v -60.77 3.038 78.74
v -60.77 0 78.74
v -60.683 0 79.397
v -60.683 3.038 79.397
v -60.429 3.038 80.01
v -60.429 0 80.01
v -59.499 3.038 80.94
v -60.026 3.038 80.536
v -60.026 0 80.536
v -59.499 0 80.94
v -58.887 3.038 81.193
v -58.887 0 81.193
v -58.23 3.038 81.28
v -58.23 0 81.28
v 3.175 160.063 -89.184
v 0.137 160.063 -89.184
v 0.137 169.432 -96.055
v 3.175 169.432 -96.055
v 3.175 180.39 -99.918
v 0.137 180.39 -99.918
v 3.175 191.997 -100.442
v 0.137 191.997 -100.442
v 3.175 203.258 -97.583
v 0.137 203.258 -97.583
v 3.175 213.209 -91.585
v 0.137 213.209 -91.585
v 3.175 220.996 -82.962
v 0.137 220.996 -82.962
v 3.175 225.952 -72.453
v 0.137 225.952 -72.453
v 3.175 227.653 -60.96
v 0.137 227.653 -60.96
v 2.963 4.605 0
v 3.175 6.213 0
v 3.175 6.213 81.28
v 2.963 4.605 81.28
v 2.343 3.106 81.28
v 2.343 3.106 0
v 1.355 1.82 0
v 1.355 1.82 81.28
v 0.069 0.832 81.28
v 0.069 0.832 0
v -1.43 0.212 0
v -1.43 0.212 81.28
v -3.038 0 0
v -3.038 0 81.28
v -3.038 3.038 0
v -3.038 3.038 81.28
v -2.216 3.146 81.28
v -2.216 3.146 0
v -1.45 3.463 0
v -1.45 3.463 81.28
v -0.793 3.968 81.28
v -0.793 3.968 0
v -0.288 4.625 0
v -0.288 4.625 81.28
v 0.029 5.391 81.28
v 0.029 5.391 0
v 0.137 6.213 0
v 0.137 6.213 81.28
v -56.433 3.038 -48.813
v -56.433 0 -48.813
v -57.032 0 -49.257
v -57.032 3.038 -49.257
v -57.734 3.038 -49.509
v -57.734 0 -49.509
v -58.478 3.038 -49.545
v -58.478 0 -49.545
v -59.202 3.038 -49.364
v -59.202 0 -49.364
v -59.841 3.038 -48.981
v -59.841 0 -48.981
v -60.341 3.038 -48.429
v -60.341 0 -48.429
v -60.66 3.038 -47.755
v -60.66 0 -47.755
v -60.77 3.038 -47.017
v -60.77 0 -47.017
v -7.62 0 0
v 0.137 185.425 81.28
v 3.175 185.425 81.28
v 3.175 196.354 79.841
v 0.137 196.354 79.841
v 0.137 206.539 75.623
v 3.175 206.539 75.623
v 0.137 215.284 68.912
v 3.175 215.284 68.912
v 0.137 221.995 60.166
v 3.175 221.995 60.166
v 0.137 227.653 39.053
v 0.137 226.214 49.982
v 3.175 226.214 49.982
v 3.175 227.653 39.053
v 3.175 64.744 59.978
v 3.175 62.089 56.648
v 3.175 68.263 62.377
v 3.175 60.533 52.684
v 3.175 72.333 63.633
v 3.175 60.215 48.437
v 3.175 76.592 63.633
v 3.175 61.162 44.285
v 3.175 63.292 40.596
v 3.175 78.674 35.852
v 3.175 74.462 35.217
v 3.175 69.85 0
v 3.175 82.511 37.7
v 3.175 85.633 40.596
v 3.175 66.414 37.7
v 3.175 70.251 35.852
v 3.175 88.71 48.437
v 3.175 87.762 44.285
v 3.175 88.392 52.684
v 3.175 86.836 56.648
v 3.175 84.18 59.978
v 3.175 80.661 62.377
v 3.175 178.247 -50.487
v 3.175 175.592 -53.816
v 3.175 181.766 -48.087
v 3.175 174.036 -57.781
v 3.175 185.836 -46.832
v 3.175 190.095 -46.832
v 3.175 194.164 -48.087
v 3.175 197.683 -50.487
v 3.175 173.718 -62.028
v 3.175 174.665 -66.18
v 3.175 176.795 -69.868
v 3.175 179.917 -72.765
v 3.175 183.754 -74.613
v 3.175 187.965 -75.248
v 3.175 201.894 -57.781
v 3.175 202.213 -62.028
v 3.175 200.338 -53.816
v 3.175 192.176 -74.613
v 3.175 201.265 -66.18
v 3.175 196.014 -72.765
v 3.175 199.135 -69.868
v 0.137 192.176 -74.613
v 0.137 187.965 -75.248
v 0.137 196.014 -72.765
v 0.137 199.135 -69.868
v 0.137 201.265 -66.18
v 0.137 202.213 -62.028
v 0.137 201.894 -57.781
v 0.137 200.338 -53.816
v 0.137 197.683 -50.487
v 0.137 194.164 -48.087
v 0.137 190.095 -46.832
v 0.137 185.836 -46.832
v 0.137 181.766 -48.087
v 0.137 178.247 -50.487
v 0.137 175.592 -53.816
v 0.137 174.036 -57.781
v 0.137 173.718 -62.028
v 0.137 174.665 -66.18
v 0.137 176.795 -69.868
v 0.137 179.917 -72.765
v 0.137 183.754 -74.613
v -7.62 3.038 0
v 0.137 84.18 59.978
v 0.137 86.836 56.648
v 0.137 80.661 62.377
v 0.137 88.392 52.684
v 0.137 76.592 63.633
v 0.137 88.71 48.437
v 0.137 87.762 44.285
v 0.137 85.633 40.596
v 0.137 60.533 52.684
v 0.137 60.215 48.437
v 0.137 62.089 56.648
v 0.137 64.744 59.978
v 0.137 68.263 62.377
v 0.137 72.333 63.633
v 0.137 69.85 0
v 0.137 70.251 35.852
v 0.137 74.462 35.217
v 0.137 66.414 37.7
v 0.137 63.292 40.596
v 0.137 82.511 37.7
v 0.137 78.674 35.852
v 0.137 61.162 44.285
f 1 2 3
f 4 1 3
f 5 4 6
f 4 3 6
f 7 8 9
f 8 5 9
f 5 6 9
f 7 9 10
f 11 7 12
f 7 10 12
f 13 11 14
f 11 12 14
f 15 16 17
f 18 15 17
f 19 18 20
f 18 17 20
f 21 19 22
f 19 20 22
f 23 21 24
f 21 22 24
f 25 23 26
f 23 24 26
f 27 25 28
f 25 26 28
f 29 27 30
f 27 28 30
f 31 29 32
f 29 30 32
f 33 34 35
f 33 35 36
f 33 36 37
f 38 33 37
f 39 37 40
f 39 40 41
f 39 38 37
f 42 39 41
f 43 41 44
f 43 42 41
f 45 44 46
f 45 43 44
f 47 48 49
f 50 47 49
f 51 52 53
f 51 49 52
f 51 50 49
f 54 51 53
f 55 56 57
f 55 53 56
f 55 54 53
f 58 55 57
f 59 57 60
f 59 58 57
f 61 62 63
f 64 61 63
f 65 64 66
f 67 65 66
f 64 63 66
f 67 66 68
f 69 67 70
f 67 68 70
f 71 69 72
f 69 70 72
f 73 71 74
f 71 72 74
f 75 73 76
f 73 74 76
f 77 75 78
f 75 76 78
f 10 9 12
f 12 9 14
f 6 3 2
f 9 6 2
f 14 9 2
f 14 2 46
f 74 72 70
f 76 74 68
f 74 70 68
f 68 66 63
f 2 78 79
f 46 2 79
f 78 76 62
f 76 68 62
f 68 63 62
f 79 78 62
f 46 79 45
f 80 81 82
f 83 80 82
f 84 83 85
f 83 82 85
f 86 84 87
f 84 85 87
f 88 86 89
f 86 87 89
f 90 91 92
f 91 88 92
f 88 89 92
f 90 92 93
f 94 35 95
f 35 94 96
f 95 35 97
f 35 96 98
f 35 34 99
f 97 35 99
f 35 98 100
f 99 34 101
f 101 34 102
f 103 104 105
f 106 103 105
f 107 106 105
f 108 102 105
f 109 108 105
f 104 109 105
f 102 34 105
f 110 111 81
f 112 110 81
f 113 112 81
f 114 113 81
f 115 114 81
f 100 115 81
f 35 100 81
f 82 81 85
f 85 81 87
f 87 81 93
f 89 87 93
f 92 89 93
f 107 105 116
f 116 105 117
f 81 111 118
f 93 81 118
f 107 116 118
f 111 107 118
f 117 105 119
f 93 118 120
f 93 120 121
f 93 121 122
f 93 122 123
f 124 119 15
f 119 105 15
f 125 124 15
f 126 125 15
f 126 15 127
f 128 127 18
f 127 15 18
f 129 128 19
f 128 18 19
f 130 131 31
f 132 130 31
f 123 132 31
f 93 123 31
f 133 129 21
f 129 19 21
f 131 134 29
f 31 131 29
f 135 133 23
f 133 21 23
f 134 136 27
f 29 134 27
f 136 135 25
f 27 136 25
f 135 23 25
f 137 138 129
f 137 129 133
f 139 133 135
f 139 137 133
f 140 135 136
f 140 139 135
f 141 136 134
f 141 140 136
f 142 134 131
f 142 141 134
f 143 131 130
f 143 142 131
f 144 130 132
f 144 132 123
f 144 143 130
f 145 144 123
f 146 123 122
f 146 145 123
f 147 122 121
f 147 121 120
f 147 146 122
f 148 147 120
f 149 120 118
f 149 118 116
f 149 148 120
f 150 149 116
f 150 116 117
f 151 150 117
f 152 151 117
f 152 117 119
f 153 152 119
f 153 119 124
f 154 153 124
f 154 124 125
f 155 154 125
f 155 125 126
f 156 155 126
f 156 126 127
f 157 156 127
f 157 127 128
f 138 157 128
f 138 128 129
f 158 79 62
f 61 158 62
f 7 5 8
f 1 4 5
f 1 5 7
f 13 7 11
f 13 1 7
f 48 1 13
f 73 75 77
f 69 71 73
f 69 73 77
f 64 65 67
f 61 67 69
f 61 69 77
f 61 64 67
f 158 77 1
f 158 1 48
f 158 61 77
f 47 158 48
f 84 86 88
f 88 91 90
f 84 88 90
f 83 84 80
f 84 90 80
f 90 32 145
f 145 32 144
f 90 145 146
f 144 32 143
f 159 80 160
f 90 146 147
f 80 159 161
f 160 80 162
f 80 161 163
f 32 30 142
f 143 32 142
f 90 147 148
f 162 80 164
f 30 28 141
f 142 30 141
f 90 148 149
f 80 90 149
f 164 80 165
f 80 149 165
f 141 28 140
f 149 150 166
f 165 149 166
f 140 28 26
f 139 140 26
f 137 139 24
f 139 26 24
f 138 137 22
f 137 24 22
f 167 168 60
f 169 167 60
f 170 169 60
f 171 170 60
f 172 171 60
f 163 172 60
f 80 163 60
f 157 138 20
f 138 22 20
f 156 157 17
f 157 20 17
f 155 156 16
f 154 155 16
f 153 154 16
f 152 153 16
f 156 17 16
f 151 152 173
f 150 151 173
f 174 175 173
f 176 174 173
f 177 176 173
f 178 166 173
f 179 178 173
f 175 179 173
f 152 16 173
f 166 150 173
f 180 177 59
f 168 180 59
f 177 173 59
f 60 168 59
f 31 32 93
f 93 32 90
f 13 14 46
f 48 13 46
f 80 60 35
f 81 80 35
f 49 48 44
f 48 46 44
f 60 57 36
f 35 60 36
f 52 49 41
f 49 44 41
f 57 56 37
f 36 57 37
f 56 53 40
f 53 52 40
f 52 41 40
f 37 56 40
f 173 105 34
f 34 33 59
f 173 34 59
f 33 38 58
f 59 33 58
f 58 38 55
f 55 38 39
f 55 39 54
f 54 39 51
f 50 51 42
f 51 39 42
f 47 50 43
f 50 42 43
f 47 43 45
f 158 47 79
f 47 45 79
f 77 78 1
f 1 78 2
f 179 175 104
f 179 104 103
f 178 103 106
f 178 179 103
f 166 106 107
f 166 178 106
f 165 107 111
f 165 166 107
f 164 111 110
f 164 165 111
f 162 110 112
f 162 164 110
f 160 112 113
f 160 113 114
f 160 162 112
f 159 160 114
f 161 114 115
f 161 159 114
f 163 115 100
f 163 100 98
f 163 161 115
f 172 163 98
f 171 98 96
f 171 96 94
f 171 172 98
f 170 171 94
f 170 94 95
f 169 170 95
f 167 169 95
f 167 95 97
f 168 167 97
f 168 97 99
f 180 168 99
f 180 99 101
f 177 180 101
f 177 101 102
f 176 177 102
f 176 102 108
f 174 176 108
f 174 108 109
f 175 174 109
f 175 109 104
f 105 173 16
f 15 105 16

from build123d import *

# Parameters (mm, degrees)
SKETCH2_R              = 14.2875
SKETCH2_W              = 81.28
SKETCH2_H              = 3.175
BOSS_EXTRUDE1_DEPTH    = 3.175
SKETCH9_R              = 14.2875
CUT_EXTRUDE2_DEPTH     = 3.175
SKETCH2_3_W            = 81.28
SKETCH2_3_H            = 3.175
BOSS_EXTRUDE2_DEPTH    = 60.7695
BOSS_EXTRUDE3_DEPTH    = 3.175
FILLET1_R              = 2.54
FILLET2_R              = 42.2275
CONVERT_SOLID2_START   = -102
CONVERT_SOLID2_DEPTH   = 184
CONVERT_SOLID2_2_DEPTH = 81.28
UNFOLD1_START          = -51
UNFOLD1_DEPTH          = 132.28
UNFOLD1_2_DEPTH        = 78.74
UNFOLD1_START_2        = 0.13716
UNFOLD1_3_DEPTH        = 3.03784
FOLD1_START            = -58.892012294
FOLD1_OUTLINE_W        = 3.03784
FOLD1_OUTLINE_H        = 81.28
FOLD1_DEPTH            = 59.530319476
FOLD1_2_DEPTH          = 6.21284
FOLD1_START_2          = -49.557397552
FOLD1_3_DEPTH          = 131.557397552


with BuildPart() as part:
    # Sketch2 → Boss-Extrude1 (new body)
    # profile 1 of 2: a face of its own
    with BuildSketch(Plane(origin=(0, 0, 0), x_dir=(0, 0, -1), z_dir=(1, 0, 0))):
        with BuildLine():
            Line((0, 3.175), (0, 69.85))
            Line((0, 69.85), (89.183866464, 160.063269699))
            ThreePointArc((89.183866464, 160.063269699), (97.582743975, 203.257963311), (60.96, 227.65258))
            Line((60.96, 227.65258), (-81.28, 227.65258))
            Line((-81.28, 227.65258), (-81.28, 69.85))
            Line((-81.28, 69.85), (-81.28, 3.175))
            Line((-81.28, 3.175), (0, 3.175))
        make_face()
        with Locations((60.96, 187.96508)):
            Circle(SKETCH2_R, mode=Mode.SUBTRACT)
    # profile 2 of 2: a face of its own
    with BuildSketch(Plane(origin=(0, 0, 0), x_dir=(0, 0, -1), z_dir=(1, 0, 0))):
        with Locations((-40.64, 1.5875)):
            Rectangle(SKETCH2_W, SKETCH2_H)
    extrude(amount=BOSS_EXTRUDE1_DEPTH)

    # Sketch9 → Cut-Extrude2 (cut)
    with BuildSketch(Plane(origin=(0, 0, 0), x_dir=(0, 0, -1), z_dir=(1, 0, 0))):
        with Locations((-49.5046, 74.46228868)):
            Circle(SKETCH9_R)
    extrude(amount=CUT_EXTRUDE2_DEPTH, mode=Mode.SUBTRACT)

    # Sketch2<3> → Boss-Extrude2 (add)
    with BuildSketch(Plane(origin=(0, 0, 0), x_dir=(0, 0, -1), z_dir=(1, 0, 0))):
        with Locations((-40.64, 1.5875)):
            Rectangle(SKETCH2_3_W, SKETCH2_3_H)
    extrude(amount=-BOSS_EXTRUDE2_DEPTH)

    # Sketch3 → Boss-Extrude3 (add)
    with BuildSketch(Plane(origin=(0, 3.175, 0), x_dir=(1, 0, 0), z_dir=(0, 1, 0))):
        Polygon((-60.7695, 0), (-60.7695, 53.1495), (-7.62, 0), align=None)
    extrude(amount=-BOSS_EXTRUDE3_DEPTH)

    # Fillet1
    fillet1_edges = [part.edges().sort_by_distance(p)[0] for p in [
        (-60.7695, 1.5875, 81.28),
        (-60.7695, 1.5875, -53.1495),
    ]]
    fillet(fillet1_edges, radius=FILLET1_R)

    # Fillet2
    fillet2_edges = [part.edges().sort_by_distance(p)[0] for p in [
        (1.5875, 227.65258, 81.28),
    ]]
    fillet(fillet2_edges, radius=FILLET2_R)

    # Convert-Solid2: read off the stored shape, not the designer's step
    # Convert-Solid2 outline → Convert-Solid2 (cut)
    with BuildSketch(Plane.XY.offset(CONVERT_SOLID2_START)):
        with BuildLine():
            ThreePointArc((3.175, 6.21284), (1.355301294, 1.819698706), (-3.03784, 0))
            Line((-3.03784, 0), (3.175, 0))
            Line((3.175, 0), (3.175, 6.21284))
        make_face()
        with BuildLine():
            Line((-60.7695, 3.175), (-60.7695, 3.03784))
            Line((-60.7695, 3.03784), (-3.03784, 3.03784))
            ThreePointArc((-3.03784, 3.03784), (-2.571212204, 3.072317193), (-2.114718593, 3.175))
            Line((-2.114718593, 3.175), (-60.7695, 3.175))
        make_face()
        with BuildLine():
            Line((0.13716, 6.21284), (0.13716, 227.65258))
            Line((0.13716, 227.65258), (0, 227.65258))
            Line((0, 227.65258), (0, 5.289718593))
            ThreePointArc((0, 5.289718593), (0.102682807, 5.746212204), (0.13716, 6.21284))
        make_face()
    extrude(amount=CONVERT_SOLID2_DEPTH, mode=Mode.SUBTRACT)

    # Convert-Solid2 2 outline → Convert-Solid2 2 (add)
    with BuildSketch(Plane.XY):
        with BuildLine():
            ThreePointArc((0, 5.289718593), (-0.79277597, 3.96777597), (-2.114718593, 3.175))
            Line((-2.114718593, 3.175), (0, 3.175))
            Line((0, 3.175), (0, 5.289718593))
        make_face()
    extrude(amount=CONVERT_SOLID2_2_DEPTH)

    # Unfold1: read off the stored shape, not the designer's step
    # Unfold1 outline → Unfold1 (cut)
    with BuildSketch(Plane.XY.offset(UNFOLD1_START)):
        with BuildLine():
            ThreePointArc((-3.03784, 0), (-1.391483498, 0.222106228), (0.13716, 0.872544516))
            Line((0.13716, 0.872544516), (0.13716, 6.21284))
            ThreePointArc((0.13716, 6.21284), (-0.79277597, 3.96777597), (-3.03784, 3.03784))
            Line((-3.03784, 3.03784), (-60.7695, 3.03784))
            Line((-60.7695, 3.03784), (-60.7695, 0))
            Line((-60.7695, 0), (-3.03784, 0))
        make_face()
    extrude(amount=UNFOLD1_DEPTH, mode=Mode.SUBTRACT)

    # Unfold1 2 outline → Unfold1 2 (add)
    with BuildSketch(Plane.XY):
        with BuildLine():
            Line((0.13716, -58.892012294), (3.175, -58.892012294))
            Line((3.175, -58.892012294), (3.175, 6.21284))
            ThreePointArc((3.175, 6.21284), (2.362398322, 3.140901373), (0.13716, 0.872544516))
            Line((0.13716, 0.872544516), (0.13716, -58.892012294))
        make_face()
    extrude(amount=UNFOLD1_2_DEPTH)

    # Unfold1 3 outline → Unfold1 3 (add)
    with BuildSketch(Plane.YZ.offset(UNFOLD1_START_2)):
        with BuildLine():
            Line((8, 81.28), (-56.352012294, 81.28))
            ThreePointArc((-56.352012294, 81.28), (-58.148063518, 80.536051224), (-58.892012294, 78.74))
            Line((-58.892012294, 78.74), (8, 78.74))
            Line((8, 78.74), (8, 81.28))
        make_face()
        with BuildLine():
            Line((-5.742512294, 0), (-58.892012294, 0))
            Line((-58.892012294, 0), (-58.892012294, -47.017397552))
            ThreePointArc((-58.892012294, -47.017397552), (-57.324028212, -49.364051564), (-54.55596107, -48.813448776))
            Line((-54.55596107, -48.813448776), (-5.742512294, 0))
        make_face()
    extrude(amount=UNFOLD1_3_DEPTH)

    # Fold1: read off the stored shape, not the designer's step
    # Fold1 outline → Fold1 (cut)
    with BuildSketch(Plane(origin=(0, 0, 0), x_dir=(1, 0, 0), z_dir=(0, 1, 0)).offset(FOLD1_START)):
        with Locations((1.65608, -40.64)):
            Rectangle(FOLD1_OUTLINE_W, FOLD1_OUTLINE_H)
    extrude(amount=FOLD1_DEPTH, mode=Mode.SUBTRACT)

    # Fold1 2 outline → Fold1 2 (add)
    with BuildSketch(Plane(origin=(0, 0, 0), x_dir=(1, 0, 0), z_dir=(0, 1, 0))):
        with BuildLine():
            ThreePointArc((-60.7695, -78.74), (-60.025551224, -80.536051224), (-58.2295, -81.28))
            Line((-58.2295, -81.28), (0.13716, -81.28))
            Line((0.13716, -81.28), (0.13716, 0))
            Line((0.13716, 0), (-7.62, 0))
            Line((-7.62, 0), (-56.433448776, 48.813448776))
            ThreePointArc((-56.433448776, 48.813448776), (-59.201515918, 49.364051564), (-60.7695, 47.017397552))
            Line((-60.7695, 47.017397552), (-60.7695, -78.74))
        make_face()
    extrude(amount=FOLD1_2_DEPTH)

    # Fold1 3 outline → Fold1 3 (cut)
    with BuildSketch(Plane.XY.offset(FOLD1_START_2)):
        with BuildLine():
            Line((-60.7695, 6.21284), (-60.7695, 3.03784))
            Line((-60.7695, 3.03784), (-3.03784, 3.03784))
            ThreePointArc((-3.03784, 3.03784), (-0.79277597, 3.96777597), (0.13716, 6.21284))
            Line((0.13716, 6.21284), (-60.7695, 6.21284))
        make_face()
        with BuildLine():
            Line((-3.03784, 0), (-60.7695, -1.4e-08))
            Line((-60.7695, -1.4e-08), (-60.7695, -60))
            Line((-60.7695, -60), (0.13716, -60))
            Line((0.13716, -60), (0.13716, -58.892012294))
            Line((0.13716, -58.892012294), (3.175, -58.892012294))
            Line((3.175, -58.892012294), (3.175, 6.21284))
            ThreePointArc((3.175, 6.21284), (1.355301294, 1.819698706), (-3.03784, 0))
        make_face()
    extrude(amount=FOLD1_3_DEPTH, mode=Mode.SUBTRACT)


solid = part.part
